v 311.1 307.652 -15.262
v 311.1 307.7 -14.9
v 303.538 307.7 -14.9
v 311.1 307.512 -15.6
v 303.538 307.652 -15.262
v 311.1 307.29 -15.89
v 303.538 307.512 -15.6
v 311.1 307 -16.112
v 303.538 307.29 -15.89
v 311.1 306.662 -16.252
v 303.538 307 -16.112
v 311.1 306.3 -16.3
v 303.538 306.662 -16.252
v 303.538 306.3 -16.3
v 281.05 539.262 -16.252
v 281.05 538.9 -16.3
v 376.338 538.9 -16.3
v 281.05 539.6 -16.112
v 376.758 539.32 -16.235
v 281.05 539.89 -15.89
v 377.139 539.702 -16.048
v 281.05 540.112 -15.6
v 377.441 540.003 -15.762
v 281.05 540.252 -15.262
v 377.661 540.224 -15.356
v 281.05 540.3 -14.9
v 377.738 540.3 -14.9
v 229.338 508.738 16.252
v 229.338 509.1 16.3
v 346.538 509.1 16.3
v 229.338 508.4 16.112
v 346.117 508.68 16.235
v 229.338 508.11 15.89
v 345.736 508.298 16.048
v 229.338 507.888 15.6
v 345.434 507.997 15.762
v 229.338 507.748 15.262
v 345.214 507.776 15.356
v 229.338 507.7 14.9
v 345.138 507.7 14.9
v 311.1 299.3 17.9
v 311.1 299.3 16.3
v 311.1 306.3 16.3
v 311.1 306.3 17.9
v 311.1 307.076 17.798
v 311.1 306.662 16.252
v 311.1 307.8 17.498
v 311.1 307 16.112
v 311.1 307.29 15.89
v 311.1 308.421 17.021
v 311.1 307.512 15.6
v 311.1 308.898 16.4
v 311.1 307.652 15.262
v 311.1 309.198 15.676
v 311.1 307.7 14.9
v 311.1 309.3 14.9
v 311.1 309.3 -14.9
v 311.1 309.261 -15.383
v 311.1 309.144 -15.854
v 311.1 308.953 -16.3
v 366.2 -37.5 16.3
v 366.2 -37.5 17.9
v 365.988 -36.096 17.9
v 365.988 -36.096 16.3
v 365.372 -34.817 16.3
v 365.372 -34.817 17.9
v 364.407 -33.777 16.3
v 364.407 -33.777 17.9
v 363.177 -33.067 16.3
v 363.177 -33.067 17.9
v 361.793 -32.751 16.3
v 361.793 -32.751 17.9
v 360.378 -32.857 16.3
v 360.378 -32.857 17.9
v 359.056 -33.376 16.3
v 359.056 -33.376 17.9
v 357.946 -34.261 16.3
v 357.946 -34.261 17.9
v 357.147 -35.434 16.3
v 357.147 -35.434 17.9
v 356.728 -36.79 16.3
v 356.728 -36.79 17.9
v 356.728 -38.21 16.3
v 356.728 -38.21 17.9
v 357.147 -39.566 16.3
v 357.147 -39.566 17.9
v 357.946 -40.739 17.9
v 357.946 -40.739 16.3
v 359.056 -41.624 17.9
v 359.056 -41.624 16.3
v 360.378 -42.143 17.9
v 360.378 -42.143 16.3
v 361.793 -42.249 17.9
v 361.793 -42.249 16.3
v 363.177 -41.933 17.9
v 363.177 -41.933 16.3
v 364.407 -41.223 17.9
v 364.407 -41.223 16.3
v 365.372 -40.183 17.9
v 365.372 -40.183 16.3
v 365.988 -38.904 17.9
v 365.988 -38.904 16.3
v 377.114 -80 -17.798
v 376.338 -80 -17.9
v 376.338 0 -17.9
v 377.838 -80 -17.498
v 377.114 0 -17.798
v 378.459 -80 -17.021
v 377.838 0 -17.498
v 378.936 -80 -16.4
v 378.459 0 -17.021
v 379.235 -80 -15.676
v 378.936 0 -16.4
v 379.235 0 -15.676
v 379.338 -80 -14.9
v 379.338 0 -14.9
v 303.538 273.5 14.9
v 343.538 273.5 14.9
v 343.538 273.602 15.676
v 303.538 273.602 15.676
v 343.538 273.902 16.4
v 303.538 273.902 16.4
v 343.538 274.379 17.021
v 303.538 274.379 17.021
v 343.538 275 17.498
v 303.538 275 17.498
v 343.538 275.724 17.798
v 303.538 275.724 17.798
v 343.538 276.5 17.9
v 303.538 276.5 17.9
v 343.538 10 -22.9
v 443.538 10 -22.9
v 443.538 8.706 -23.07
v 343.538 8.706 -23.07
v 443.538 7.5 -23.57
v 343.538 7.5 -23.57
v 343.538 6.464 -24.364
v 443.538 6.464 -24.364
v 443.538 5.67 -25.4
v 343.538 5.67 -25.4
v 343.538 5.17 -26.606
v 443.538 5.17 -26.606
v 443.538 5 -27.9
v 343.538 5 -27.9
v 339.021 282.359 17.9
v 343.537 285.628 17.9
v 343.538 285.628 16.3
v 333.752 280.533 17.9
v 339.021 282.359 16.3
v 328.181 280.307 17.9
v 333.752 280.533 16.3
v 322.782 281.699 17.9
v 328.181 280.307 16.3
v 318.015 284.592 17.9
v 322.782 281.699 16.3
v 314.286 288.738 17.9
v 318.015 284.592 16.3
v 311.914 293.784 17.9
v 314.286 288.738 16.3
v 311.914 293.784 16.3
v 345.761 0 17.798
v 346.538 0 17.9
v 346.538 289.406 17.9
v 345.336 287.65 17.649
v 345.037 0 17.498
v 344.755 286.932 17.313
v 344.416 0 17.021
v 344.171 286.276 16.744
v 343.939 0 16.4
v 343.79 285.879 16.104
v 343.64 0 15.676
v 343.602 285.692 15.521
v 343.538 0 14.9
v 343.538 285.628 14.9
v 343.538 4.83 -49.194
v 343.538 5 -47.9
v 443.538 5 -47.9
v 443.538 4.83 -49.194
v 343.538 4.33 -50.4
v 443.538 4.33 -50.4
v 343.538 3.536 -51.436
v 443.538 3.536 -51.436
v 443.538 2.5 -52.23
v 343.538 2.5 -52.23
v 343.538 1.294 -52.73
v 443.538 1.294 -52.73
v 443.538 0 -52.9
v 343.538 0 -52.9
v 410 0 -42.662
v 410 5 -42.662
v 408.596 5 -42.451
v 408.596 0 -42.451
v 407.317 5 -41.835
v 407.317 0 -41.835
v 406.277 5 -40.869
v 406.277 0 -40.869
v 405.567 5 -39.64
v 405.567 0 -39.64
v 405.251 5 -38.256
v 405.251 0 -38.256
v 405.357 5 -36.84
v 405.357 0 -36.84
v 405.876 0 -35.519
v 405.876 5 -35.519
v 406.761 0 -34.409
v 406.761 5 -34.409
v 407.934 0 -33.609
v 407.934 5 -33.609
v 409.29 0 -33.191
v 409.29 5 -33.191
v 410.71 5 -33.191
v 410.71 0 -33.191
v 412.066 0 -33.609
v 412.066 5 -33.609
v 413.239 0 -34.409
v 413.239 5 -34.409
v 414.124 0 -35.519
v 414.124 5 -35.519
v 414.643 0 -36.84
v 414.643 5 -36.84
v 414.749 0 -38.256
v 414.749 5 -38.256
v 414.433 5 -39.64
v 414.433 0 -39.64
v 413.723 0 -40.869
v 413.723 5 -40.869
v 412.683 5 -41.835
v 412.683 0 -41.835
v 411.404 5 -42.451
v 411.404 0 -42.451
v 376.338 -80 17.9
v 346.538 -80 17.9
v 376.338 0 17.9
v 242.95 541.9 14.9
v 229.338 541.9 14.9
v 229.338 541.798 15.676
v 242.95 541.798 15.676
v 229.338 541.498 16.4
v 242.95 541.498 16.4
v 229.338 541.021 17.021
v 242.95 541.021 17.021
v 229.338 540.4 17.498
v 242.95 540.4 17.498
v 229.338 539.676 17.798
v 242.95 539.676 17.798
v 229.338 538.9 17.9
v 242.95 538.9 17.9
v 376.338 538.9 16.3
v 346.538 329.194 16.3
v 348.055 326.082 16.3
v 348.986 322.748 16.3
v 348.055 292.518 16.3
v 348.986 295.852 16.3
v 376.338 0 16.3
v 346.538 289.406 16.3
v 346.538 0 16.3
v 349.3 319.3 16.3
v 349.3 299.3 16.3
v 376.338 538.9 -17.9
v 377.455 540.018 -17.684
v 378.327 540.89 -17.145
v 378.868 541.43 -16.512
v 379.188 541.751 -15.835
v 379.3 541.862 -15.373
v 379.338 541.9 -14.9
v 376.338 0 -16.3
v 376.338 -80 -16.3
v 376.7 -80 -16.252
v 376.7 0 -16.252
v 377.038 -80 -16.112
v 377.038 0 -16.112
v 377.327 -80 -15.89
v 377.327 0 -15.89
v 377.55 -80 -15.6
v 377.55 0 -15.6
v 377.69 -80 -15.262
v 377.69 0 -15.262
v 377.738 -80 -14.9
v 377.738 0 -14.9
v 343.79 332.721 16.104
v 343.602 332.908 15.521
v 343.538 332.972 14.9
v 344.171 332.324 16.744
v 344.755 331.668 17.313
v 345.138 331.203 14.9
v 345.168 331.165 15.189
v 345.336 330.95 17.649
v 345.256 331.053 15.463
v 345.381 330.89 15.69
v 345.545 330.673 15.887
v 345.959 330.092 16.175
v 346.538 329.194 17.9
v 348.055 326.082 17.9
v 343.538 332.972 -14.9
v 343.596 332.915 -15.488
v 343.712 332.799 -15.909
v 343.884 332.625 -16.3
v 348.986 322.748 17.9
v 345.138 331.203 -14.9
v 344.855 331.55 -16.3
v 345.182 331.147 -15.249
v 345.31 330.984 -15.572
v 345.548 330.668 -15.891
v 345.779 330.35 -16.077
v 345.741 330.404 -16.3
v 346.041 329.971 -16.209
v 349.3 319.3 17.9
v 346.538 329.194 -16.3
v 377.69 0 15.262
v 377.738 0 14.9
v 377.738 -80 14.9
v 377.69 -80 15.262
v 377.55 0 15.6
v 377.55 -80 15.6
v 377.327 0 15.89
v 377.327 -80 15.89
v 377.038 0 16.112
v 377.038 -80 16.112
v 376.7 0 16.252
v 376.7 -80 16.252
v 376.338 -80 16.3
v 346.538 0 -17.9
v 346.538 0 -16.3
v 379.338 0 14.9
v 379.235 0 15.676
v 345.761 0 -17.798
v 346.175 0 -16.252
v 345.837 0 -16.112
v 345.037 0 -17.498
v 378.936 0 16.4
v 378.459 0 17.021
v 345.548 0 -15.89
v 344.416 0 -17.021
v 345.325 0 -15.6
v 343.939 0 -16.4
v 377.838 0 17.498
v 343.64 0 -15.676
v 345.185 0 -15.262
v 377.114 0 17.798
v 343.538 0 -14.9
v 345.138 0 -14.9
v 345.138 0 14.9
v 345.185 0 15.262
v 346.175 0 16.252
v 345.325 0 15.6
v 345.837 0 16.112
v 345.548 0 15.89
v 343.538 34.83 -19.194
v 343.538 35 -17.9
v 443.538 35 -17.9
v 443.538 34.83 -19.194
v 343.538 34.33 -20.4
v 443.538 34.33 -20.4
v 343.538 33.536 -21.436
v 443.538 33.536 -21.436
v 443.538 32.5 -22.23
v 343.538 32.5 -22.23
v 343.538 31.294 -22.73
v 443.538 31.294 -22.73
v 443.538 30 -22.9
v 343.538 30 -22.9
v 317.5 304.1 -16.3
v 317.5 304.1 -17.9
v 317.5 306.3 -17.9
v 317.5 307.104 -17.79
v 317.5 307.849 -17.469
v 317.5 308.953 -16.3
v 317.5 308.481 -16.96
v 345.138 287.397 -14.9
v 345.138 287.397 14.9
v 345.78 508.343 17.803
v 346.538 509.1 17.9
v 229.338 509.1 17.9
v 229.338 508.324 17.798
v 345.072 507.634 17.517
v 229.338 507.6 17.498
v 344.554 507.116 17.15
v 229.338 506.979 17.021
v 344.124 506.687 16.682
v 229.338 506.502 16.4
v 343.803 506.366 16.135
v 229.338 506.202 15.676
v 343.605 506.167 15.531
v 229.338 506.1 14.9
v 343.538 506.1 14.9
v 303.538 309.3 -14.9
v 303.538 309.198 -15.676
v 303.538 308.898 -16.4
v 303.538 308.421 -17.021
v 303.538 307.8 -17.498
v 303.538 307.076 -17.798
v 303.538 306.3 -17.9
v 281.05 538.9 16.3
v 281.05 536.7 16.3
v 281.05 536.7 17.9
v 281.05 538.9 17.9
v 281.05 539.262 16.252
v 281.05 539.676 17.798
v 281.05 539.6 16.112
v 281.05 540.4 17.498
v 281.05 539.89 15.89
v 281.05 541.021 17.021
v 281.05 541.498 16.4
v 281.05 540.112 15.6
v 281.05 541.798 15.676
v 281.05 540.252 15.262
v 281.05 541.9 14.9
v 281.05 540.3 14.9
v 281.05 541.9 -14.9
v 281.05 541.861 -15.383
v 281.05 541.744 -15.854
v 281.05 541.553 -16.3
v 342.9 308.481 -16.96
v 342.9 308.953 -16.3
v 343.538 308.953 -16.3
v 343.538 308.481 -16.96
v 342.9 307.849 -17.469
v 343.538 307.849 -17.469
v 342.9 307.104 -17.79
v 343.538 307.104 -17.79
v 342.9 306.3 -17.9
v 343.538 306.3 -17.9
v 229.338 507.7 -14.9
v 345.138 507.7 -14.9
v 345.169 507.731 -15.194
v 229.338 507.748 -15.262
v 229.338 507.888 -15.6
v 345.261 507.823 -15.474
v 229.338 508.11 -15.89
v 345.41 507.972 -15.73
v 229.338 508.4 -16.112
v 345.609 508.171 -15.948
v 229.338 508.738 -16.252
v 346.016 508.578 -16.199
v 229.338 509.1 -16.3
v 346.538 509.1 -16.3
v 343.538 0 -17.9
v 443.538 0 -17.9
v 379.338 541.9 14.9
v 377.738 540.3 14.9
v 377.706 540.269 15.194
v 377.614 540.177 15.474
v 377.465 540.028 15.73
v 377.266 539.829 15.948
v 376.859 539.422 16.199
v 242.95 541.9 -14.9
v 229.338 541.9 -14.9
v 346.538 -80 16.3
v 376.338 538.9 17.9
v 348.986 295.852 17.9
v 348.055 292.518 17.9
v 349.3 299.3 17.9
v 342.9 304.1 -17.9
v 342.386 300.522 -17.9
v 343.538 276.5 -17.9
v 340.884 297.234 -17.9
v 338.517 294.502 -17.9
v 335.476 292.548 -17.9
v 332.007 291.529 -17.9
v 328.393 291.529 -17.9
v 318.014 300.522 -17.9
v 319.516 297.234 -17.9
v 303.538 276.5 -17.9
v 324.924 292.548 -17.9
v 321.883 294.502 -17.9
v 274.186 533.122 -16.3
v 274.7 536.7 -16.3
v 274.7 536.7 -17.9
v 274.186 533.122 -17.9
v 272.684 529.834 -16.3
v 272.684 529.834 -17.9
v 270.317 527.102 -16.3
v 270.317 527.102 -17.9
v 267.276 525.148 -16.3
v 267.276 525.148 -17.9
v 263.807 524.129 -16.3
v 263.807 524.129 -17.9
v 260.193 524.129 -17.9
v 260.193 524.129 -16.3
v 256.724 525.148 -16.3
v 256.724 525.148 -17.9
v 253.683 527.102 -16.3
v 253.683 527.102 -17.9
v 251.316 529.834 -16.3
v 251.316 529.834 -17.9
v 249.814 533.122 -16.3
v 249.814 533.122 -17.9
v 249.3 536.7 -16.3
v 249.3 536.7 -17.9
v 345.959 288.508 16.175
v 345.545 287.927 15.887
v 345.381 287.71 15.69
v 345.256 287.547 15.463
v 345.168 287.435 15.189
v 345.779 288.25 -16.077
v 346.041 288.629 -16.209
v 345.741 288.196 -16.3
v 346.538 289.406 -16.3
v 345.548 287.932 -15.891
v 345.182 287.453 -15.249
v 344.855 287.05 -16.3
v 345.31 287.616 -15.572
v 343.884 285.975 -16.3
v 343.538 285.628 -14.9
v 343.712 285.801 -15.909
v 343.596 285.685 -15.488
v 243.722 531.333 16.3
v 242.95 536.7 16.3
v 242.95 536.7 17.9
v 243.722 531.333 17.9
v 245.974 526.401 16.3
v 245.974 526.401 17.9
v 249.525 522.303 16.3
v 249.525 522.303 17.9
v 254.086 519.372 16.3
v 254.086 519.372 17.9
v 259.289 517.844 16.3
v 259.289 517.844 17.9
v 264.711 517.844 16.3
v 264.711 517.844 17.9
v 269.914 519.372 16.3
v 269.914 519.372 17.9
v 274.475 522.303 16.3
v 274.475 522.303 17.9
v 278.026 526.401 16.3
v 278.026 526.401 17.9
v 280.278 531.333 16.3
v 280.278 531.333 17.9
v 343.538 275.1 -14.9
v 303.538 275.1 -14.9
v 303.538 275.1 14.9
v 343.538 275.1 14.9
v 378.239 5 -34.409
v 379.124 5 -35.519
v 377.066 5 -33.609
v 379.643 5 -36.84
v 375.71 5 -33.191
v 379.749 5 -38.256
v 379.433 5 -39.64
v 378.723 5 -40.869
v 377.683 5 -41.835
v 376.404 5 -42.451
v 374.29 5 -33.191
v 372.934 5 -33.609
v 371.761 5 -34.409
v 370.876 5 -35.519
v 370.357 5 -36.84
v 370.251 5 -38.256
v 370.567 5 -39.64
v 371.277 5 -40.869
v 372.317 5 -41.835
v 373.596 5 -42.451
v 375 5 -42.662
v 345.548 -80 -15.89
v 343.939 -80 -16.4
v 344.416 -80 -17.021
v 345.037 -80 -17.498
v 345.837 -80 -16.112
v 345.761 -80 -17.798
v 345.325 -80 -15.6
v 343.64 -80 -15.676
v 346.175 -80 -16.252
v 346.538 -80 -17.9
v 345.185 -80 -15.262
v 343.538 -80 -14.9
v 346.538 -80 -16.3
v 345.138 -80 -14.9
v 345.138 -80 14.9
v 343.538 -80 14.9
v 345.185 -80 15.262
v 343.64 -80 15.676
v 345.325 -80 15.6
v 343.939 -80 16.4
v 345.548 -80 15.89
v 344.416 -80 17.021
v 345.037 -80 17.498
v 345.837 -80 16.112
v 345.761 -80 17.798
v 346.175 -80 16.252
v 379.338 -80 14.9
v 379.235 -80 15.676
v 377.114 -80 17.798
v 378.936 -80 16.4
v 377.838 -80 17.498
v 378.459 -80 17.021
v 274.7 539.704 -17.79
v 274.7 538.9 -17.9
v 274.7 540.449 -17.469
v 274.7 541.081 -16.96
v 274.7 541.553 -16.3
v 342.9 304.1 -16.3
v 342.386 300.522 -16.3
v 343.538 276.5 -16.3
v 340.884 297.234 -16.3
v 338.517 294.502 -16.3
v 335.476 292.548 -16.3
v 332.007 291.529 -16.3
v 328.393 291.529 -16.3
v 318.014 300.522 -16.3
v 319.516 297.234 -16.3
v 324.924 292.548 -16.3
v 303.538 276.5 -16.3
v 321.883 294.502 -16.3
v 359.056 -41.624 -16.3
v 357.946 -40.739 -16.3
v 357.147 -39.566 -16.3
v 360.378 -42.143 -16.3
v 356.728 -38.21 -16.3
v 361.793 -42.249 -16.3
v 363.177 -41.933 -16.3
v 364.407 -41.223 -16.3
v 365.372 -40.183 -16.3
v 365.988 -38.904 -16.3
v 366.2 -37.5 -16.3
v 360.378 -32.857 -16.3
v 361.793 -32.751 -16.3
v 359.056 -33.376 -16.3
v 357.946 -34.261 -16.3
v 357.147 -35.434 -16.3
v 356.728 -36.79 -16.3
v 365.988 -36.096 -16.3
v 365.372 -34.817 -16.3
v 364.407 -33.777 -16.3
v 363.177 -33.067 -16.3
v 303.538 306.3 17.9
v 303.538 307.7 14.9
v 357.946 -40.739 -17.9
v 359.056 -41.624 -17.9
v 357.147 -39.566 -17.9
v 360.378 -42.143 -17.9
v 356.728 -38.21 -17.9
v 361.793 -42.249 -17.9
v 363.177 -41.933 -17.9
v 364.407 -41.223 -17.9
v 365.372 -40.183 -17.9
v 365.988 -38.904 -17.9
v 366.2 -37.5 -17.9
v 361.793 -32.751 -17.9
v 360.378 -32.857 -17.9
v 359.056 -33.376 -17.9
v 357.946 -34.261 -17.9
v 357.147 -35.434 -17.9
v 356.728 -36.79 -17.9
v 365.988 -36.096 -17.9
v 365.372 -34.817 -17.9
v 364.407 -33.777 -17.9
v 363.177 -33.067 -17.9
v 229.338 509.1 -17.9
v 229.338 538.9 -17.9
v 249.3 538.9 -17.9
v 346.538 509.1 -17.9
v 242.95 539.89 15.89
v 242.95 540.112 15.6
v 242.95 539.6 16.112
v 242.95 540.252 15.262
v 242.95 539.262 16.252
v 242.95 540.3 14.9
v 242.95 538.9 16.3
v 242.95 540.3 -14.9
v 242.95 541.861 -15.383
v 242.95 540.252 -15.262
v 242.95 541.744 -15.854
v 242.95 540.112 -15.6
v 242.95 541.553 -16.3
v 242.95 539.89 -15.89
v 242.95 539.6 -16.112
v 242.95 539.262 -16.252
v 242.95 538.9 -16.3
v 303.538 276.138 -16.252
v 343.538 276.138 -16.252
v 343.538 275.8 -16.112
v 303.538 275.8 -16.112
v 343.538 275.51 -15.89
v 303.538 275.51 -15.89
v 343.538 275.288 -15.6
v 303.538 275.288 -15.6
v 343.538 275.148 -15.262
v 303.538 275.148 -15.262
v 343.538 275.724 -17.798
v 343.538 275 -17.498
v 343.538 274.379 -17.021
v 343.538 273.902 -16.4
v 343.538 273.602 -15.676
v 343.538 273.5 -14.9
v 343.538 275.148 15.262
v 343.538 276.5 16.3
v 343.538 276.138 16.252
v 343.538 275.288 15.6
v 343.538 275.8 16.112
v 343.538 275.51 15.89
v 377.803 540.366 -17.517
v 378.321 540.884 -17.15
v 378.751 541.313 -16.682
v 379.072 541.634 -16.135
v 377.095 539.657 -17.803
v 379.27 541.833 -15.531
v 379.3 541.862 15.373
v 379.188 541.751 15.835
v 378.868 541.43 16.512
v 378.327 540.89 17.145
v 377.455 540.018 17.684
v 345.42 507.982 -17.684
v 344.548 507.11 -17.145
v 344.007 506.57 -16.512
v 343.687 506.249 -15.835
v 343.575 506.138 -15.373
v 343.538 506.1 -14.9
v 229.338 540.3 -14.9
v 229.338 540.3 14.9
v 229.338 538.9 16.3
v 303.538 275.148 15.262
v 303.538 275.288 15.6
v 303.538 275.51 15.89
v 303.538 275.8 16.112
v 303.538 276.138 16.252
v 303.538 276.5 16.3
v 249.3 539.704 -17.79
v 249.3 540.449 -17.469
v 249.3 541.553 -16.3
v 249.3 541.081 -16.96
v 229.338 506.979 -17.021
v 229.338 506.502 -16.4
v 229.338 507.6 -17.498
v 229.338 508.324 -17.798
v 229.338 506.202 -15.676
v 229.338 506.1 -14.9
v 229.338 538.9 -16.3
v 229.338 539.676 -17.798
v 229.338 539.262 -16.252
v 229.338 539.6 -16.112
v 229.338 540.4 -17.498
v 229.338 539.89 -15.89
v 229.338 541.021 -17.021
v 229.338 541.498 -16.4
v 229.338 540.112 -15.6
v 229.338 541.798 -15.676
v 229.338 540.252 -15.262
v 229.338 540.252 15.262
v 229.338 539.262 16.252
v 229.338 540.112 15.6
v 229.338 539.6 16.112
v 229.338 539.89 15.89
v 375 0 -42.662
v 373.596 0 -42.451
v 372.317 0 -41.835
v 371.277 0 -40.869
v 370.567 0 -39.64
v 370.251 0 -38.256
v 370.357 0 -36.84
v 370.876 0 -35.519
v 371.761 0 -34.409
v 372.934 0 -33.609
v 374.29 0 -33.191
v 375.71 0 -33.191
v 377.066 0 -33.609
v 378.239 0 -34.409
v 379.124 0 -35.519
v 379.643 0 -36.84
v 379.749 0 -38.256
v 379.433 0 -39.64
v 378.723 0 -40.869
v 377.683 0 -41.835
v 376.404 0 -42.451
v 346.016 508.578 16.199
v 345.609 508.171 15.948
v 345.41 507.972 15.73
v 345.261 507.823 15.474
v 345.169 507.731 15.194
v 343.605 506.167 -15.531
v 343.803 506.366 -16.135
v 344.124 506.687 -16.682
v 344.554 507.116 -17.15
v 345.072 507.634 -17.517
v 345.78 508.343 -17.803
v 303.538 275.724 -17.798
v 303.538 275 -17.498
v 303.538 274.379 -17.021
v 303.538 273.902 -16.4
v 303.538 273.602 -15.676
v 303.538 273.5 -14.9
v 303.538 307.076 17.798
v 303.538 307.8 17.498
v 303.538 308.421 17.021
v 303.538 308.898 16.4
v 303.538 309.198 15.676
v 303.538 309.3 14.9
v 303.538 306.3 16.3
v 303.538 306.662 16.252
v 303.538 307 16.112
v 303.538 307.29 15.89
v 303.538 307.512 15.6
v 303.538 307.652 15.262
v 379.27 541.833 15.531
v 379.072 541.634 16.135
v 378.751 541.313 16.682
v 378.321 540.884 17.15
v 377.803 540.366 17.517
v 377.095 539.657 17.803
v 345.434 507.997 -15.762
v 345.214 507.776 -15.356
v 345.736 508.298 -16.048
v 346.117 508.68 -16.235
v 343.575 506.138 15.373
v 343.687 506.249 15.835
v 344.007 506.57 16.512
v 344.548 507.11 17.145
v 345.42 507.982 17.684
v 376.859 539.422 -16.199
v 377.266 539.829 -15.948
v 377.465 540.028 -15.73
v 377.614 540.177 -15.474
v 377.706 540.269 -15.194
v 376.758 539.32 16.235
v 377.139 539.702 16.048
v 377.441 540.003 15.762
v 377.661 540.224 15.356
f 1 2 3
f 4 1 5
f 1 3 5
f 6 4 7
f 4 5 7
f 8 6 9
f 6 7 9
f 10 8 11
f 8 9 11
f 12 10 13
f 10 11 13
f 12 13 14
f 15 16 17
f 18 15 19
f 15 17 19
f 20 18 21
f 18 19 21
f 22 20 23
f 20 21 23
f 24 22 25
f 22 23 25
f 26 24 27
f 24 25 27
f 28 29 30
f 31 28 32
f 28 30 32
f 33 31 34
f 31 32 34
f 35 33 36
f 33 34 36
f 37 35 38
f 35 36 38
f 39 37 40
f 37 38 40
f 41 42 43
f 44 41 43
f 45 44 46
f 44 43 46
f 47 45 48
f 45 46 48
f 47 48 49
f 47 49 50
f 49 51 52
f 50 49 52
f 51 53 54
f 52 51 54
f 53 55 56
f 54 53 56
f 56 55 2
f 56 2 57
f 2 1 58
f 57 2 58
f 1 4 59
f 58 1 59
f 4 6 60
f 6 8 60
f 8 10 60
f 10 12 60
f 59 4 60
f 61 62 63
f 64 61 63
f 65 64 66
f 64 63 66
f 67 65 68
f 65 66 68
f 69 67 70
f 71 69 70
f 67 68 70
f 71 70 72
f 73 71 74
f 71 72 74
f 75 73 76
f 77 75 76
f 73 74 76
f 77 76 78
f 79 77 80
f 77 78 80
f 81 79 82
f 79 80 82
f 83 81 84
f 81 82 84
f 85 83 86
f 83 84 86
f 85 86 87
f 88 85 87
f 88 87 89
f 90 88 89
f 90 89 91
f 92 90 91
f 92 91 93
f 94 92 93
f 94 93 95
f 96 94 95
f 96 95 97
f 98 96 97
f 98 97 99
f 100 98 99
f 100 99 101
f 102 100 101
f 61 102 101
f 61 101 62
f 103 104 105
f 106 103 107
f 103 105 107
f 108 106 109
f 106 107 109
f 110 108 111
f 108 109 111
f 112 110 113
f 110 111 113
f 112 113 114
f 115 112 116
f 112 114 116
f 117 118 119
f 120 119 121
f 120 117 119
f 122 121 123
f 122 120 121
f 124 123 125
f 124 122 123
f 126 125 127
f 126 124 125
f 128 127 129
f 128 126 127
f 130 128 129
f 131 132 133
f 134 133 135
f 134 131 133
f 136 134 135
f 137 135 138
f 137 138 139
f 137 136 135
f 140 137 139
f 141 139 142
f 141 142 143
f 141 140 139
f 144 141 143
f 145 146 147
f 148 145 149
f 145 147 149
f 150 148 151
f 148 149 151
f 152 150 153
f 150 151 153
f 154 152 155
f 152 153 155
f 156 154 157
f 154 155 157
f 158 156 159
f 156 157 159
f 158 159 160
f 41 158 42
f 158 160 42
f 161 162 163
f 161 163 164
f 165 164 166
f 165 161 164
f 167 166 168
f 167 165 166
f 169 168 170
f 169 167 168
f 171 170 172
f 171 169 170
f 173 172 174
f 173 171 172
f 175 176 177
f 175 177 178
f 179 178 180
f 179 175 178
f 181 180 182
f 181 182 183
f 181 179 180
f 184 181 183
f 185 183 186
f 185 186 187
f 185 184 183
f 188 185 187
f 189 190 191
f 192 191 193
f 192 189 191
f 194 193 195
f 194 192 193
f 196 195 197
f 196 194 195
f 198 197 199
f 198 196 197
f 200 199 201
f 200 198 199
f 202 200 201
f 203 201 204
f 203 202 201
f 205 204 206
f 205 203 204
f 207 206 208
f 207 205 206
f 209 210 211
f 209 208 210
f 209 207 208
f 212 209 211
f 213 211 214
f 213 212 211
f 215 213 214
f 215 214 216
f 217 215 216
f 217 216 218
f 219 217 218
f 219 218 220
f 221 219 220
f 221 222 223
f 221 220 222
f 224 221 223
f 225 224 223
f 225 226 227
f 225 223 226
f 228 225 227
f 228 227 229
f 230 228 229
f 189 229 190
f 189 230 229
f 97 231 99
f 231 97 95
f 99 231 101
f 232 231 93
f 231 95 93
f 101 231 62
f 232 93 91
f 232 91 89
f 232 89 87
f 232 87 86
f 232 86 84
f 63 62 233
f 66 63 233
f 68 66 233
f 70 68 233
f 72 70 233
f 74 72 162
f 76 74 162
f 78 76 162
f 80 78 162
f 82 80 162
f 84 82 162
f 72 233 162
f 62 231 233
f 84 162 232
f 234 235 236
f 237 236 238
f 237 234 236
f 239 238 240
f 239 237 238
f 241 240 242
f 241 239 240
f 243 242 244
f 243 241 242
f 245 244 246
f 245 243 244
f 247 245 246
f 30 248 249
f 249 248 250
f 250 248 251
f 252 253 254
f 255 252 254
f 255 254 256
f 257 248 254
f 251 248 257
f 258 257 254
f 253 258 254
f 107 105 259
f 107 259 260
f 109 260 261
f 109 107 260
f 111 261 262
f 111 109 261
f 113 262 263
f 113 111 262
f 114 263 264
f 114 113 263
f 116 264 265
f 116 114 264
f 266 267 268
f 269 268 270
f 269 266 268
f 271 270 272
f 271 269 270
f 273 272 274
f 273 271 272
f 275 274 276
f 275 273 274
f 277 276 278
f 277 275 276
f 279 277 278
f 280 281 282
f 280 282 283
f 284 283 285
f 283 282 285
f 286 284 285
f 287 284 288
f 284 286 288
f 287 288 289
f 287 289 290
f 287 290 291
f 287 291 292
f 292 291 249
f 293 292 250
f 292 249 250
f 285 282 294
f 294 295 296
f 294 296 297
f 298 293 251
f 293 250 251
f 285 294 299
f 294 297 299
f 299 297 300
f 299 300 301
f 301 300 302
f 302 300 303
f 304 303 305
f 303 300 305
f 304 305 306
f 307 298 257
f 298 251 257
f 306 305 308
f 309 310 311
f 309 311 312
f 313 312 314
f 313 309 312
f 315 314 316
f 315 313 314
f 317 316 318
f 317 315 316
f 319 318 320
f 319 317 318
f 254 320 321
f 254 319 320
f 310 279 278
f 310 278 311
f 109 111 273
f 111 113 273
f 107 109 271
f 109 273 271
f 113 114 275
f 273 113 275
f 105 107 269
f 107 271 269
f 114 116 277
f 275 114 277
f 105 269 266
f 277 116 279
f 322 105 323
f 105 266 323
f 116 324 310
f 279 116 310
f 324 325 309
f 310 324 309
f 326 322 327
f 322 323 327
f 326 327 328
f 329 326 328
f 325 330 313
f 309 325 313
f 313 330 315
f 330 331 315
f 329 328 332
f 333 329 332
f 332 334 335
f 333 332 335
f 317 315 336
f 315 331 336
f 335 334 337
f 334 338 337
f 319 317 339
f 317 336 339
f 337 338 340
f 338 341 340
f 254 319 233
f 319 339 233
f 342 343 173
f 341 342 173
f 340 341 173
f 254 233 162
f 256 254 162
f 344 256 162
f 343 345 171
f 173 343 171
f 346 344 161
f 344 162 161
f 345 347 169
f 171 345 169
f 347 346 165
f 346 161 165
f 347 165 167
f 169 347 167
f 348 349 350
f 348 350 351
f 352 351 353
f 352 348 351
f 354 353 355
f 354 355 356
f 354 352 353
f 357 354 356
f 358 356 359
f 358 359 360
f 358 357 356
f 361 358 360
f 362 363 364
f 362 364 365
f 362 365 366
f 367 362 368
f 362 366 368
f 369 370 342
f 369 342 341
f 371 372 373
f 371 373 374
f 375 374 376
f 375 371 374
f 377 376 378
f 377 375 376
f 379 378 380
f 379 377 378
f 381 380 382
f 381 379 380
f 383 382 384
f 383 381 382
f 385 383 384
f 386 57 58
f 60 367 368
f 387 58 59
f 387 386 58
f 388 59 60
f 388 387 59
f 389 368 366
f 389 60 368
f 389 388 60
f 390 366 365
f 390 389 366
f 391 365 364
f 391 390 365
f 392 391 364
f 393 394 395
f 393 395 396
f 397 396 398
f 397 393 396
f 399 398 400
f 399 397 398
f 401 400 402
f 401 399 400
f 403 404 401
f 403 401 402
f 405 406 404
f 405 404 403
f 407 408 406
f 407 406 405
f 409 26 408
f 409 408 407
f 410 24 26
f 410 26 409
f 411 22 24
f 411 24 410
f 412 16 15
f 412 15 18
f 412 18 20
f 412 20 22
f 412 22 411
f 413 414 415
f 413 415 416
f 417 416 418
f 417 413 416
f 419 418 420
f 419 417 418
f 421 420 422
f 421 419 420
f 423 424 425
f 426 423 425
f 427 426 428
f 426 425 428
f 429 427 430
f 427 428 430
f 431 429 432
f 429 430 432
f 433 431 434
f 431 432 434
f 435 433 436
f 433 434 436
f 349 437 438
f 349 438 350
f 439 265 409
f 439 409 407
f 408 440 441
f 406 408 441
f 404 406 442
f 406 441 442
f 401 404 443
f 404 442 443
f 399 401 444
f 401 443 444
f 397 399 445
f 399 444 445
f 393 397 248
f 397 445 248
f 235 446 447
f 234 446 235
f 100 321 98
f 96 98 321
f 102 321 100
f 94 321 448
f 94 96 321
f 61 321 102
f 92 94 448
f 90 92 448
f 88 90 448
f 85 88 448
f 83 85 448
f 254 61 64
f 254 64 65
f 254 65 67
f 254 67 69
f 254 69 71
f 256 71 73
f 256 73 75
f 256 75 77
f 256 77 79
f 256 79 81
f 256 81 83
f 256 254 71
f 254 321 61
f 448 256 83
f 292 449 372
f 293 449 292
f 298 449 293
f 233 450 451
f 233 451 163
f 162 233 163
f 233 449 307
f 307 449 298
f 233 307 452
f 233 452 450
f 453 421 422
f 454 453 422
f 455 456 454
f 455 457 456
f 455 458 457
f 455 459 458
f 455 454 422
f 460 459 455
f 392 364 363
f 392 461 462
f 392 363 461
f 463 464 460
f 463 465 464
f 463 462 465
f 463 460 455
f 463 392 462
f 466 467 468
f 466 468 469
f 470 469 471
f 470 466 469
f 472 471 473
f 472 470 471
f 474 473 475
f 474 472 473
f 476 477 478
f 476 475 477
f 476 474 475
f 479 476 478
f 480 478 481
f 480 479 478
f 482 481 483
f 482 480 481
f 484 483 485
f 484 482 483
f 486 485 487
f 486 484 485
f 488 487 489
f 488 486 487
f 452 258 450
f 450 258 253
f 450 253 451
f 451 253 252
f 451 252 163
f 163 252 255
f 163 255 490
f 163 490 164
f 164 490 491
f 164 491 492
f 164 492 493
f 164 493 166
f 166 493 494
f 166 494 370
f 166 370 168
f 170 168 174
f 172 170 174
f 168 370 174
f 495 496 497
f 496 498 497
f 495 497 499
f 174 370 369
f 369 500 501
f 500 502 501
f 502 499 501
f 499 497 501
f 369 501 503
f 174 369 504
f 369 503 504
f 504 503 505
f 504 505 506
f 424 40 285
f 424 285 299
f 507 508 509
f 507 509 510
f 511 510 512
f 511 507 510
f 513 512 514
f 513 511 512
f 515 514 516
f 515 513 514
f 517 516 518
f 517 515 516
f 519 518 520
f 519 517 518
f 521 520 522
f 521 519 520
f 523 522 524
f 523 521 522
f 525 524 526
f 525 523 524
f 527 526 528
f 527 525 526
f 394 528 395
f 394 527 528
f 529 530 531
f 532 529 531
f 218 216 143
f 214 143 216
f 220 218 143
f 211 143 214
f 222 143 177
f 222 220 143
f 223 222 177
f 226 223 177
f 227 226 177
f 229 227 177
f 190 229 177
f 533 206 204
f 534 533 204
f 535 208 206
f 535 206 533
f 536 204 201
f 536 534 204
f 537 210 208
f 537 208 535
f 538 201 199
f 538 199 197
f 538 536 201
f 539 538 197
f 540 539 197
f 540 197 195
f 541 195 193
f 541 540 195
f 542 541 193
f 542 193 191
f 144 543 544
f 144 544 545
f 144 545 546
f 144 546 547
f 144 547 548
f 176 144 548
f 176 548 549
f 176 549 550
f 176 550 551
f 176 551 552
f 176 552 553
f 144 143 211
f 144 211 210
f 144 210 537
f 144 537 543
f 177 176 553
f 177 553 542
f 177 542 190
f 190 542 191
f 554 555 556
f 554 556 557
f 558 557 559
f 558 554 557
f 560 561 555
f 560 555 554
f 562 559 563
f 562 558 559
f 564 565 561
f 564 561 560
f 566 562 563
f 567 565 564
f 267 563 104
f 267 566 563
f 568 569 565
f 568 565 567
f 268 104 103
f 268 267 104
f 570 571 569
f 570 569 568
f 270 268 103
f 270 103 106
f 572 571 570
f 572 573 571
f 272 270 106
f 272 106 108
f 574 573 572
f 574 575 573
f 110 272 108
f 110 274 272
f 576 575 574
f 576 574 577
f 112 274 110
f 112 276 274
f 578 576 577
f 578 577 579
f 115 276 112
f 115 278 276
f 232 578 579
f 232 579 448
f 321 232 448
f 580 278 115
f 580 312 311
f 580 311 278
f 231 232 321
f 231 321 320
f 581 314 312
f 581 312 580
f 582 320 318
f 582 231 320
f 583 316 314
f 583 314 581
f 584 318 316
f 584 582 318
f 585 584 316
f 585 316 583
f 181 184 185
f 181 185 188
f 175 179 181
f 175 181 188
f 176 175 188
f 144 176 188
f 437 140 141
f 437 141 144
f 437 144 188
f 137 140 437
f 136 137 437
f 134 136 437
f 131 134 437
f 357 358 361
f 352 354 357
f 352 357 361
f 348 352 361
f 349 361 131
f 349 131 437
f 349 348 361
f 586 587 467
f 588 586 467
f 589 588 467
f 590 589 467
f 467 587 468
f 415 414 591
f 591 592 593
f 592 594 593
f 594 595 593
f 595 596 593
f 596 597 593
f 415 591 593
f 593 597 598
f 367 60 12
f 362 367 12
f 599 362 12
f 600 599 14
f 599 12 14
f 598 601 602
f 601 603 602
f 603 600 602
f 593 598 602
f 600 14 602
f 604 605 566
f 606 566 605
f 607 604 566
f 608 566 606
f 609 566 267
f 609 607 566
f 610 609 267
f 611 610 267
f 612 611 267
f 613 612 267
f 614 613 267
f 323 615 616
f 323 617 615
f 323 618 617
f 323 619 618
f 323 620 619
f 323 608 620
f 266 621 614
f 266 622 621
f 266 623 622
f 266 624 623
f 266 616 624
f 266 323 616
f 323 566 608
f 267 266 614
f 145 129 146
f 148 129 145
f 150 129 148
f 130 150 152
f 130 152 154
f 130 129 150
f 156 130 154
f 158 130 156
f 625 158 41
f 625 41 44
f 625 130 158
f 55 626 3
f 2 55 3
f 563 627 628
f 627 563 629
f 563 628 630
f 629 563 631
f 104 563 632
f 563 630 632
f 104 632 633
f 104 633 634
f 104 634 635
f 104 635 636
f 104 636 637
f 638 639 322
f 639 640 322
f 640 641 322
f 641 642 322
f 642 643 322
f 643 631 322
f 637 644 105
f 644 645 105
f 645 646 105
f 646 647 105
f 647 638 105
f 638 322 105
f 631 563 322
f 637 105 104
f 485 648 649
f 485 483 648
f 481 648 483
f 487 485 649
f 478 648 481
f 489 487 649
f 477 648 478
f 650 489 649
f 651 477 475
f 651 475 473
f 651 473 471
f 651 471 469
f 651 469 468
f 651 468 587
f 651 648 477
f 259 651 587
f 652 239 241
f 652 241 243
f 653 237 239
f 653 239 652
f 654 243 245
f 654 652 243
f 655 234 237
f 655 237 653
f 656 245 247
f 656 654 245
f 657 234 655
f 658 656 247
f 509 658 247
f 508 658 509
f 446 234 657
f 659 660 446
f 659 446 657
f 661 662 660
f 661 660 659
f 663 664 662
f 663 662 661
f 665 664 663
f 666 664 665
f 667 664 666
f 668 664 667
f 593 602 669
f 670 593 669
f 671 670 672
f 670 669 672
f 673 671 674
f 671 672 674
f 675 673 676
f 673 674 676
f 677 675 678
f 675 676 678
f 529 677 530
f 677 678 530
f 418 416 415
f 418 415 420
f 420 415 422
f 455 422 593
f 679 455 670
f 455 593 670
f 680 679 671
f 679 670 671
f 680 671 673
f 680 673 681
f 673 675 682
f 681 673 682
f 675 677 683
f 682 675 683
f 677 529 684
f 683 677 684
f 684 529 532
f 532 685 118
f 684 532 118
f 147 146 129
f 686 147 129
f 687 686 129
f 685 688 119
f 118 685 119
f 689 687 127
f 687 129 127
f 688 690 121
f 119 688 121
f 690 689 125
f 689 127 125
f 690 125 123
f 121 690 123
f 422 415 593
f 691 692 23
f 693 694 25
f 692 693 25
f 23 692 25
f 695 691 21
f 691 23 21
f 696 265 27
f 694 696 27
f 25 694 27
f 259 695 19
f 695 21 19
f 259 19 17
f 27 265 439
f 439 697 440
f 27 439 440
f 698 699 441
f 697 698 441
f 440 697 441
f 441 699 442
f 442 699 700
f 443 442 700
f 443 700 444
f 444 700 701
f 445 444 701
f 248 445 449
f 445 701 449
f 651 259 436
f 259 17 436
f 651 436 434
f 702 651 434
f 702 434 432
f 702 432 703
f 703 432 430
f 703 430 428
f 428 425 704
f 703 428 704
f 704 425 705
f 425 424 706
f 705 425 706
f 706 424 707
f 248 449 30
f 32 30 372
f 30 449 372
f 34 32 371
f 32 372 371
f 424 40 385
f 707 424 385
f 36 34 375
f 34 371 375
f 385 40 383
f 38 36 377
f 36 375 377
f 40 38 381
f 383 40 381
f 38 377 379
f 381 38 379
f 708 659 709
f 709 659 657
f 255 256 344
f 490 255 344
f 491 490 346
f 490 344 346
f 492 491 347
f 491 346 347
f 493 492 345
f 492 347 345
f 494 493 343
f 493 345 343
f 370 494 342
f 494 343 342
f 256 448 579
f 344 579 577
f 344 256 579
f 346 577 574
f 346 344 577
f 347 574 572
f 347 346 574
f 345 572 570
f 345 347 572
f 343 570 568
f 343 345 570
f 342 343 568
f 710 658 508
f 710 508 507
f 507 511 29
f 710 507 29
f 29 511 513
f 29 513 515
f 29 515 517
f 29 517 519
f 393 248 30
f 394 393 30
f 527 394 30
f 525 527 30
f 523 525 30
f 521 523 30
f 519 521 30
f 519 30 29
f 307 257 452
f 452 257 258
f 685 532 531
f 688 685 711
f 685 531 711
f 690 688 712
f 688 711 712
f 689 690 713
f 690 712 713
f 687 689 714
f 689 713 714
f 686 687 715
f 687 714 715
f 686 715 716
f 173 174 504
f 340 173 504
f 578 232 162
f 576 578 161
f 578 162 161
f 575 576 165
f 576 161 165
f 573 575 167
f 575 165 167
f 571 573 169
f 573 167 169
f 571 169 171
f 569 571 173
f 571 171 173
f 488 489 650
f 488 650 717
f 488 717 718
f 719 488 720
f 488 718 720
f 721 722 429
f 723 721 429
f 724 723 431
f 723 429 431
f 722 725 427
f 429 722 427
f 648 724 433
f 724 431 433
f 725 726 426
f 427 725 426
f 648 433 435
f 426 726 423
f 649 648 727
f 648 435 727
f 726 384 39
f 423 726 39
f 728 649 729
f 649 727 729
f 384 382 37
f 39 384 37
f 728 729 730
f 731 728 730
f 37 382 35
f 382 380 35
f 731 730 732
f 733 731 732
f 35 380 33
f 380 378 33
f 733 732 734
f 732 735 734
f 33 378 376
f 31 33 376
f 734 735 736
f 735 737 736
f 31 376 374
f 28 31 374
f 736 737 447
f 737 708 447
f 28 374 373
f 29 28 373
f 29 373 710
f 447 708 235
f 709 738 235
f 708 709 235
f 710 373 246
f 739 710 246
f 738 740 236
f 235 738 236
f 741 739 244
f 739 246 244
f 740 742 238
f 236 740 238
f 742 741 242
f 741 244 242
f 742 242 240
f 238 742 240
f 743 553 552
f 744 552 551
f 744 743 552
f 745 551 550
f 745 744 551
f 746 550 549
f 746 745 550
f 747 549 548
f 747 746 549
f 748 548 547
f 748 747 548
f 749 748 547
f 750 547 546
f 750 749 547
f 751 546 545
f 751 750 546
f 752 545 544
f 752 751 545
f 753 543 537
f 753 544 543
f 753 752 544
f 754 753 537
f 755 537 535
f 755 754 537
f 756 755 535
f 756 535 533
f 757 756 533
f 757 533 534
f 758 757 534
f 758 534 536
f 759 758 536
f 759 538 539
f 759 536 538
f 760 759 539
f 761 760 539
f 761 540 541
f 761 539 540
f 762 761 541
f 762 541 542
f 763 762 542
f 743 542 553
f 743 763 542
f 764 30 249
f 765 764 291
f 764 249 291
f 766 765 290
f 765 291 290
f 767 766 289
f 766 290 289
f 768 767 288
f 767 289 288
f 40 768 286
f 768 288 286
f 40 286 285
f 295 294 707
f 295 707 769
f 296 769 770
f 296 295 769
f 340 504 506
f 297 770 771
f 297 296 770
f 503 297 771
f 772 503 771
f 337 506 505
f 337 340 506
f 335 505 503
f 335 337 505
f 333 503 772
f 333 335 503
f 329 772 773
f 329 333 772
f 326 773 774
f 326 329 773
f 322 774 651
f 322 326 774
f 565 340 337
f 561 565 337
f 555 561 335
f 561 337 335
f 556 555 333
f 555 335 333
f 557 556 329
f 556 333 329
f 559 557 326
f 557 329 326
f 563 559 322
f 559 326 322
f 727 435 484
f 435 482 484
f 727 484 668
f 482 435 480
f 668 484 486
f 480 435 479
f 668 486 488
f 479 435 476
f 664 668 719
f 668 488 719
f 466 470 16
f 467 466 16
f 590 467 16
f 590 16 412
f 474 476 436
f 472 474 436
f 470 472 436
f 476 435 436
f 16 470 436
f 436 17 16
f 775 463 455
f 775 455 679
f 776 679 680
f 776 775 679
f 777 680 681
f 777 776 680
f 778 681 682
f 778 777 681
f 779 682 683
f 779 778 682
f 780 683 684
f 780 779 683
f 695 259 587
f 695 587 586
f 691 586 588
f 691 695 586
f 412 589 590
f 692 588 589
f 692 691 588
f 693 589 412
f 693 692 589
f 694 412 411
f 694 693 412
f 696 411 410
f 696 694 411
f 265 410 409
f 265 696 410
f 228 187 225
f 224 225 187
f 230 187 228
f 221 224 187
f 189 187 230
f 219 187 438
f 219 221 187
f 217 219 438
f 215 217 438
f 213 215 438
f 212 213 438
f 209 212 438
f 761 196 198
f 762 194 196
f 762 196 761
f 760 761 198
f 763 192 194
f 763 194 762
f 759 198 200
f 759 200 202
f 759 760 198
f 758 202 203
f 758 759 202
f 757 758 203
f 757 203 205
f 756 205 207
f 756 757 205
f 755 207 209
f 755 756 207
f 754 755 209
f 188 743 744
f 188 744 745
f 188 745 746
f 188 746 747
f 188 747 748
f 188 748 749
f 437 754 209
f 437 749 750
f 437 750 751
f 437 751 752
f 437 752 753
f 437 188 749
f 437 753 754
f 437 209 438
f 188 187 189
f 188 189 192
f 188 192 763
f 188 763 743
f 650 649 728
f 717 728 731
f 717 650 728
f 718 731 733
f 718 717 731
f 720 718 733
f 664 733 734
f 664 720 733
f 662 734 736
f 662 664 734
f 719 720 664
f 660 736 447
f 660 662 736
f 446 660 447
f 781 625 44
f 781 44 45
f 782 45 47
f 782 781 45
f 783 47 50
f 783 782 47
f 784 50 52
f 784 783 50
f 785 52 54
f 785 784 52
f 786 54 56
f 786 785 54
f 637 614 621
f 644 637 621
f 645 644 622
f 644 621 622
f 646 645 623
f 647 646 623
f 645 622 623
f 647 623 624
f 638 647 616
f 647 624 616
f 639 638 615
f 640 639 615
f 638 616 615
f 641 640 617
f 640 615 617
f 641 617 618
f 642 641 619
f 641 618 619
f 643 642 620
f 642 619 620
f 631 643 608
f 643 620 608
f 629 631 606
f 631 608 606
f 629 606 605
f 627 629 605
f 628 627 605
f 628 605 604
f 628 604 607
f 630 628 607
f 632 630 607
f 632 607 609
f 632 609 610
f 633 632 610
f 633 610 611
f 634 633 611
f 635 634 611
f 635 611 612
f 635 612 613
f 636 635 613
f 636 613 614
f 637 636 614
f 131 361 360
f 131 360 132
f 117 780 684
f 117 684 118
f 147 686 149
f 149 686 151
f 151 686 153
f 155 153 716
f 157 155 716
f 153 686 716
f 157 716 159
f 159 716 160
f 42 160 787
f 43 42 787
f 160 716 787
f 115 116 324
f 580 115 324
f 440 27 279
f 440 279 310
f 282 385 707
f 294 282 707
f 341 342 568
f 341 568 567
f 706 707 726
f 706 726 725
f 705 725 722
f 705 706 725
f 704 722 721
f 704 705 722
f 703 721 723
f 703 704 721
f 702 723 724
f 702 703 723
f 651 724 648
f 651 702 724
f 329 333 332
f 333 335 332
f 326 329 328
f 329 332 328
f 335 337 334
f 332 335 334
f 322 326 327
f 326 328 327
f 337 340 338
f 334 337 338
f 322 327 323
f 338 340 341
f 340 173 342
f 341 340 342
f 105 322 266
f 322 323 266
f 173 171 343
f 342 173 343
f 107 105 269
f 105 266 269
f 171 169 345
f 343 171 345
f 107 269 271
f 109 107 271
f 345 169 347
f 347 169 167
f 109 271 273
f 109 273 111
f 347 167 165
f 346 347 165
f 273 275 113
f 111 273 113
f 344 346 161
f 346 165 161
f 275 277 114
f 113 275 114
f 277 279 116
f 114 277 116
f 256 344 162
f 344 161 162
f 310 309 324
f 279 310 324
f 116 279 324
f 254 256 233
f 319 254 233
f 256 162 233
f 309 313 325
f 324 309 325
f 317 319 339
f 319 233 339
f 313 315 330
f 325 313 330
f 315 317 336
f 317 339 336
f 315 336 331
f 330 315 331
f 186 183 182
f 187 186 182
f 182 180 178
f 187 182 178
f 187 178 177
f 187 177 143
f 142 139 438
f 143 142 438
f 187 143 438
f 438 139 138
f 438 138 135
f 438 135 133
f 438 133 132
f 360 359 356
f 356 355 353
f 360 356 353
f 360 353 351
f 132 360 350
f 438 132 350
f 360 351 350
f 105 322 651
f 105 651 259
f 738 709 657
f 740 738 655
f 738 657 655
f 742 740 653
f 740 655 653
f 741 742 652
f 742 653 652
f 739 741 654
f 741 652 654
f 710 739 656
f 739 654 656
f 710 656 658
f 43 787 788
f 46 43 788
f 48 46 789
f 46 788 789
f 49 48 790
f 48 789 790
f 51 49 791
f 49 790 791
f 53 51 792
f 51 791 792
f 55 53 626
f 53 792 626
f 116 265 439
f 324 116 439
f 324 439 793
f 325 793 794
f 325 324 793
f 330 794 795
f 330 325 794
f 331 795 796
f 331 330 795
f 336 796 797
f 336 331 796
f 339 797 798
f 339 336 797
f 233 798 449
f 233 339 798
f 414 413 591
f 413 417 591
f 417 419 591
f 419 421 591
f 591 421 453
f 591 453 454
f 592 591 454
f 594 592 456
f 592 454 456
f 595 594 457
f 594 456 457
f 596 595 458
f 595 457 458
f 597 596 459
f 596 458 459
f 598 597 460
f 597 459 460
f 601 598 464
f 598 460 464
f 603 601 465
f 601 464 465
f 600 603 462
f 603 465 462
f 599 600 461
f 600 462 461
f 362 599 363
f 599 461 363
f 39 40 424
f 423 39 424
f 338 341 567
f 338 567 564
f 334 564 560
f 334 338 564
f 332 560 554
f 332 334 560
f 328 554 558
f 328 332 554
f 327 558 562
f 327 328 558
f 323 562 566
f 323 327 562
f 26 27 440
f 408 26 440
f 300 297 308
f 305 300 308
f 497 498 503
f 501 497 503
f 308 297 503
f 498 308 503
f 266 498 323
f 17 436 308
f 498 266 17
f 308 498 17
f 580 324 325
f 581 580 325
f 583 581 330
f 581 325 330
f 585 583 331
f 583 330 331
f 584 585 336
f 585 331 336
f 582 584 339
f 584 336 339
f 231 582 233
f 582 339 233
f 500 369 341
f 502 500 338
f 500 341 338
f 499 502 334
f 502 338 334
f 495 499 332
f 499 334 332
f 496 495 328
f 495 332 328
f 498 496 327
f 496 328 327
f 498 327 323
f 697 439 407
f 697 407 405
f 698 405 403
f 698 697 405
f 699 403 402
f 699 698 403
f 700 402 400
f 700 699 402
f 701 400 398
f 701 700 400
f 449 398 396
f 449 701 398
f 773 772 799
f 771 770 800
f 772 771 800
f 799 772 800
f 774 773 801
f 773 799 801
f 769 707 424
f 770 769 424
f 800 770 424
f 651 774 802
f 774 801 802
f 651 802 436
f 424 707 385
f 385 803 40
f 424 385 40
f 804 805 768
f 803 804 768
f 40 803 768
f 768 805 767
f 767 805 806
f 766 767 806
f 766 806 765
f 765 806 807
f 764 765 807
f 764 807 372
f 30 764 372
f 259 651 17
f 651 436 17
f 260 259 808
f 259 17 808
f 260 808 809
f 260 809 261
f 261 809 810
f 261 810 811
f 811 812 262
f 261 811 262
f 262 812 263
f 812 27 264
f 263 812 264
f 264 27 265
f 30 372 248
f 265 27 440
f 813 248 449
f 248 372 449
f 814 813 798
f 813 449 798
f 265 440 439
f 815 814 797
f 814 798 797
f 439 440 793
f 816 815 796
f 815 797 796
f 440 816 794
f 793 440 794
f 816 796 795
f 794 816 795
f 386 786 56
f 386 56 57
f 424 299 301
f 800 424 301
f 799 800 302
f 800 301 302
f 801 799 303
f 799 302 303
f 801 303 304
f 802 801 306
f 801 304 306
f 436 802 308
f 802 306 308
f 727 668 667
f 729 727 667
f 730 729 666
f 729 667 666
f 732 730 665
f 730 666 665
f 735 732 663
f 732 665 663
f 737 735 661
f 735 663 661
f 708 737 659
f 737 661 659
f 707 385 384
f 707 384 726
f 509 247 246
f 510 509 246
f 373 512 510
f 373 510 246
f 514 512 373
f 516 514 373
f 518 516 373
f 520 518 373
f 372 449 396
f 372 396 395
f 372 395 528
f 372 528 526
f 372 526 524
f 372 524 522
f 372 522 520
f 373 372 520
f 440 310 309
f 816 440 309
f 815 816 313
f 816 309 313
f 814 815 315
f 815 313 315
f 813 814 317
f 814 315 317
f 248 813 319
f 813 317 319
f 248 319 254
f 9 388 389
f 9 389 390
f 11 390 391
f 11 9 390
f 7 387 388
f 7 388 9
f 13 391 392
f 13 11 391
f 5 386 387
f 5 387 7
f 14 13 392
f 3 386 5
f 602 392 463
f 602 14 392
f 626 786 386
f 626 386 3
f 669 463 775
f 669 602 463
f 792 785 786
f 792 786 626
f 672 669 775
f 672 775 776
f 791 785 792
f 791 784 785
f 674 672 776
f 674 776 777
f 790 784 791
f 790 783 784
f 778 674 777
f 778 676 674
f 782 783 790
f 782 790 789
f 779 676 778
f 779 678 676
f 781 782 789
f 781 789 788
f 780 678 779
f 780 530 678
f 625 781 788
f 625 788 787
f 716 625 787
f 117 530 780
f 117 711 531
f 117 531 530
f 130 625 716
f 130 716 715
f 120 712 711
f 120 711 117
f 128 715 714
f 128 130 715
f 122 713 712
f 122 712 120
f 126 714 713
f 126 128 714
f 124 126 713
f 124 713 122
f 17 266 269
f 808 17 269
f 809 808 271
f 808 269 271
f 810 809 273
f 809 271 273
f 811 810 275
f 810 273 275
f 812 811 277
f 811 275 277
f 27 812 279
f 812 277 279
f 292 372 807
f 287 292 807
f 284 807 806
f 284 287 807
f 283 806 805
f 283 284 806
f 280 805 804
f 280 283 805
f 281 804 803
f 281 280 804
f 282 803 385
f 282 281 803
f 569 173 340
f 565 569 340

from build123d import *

# Parameters (mm, degrees)
STRUCTURAL_MEMBERMAIN_DEPTH                   = 1
STRUCTURAL_MEMBERMAIN_DEPTH_BACK              = 80
STRUCTURAL_MEMBERMAIN_2_DEPTH                 = 551.314422766
STRUCTURAL_MEMBERMAIN_3_DEPTH                 = 158.414422766
STRUCTURAL_MEMBERMAIN_4_DEPTH                 = 58.9
CUT_EXTRUDETOPRAILGUIDE_DEPTH                 = 662.71969814
CUT_EXTRUDETOPRAILGUIDE_DEPTH_BACK            = 662.71969814
STRUCTURAL_MEMBERANGLE_DEPTH                  = 100
SKETCH15_R                                    = 4.7625
CUT_EXTRUDEMOUNTINGHOLES_DEPTH                = 703.267423355
CUT_EXTRUDEENLARGERAILGUIDE_REACH             = 704.267
CUT_EXTRUDEENLARGERAILGUIDE_DIRECTION_2_DEPTH = 703.267423355
CUT_EXTRUDE1_DEPTH                            = 702.186682636
CUT_EXTRUDE2_START                            = -34.2
CUT_EXTRUDE2_DEPTH                            = 34.2
SKETCH19_R                                    = 4.7625
CUT_EXTRUDE3_DEPTH                            = 704.842144167


with BuildPart() as part:
    # Sketch11 → Structural MemberMain (new, two sides)
    with BuildSketch(Plane(origin=(361.4375, 0, 0), x_dir=(-1, 0, 0), z_dir=(0, 1, 0))) as structural_membermain_sk:
        with BuildLine():
            Line((-14.9, 17.9), (14.9, 17.9))
            ThreePointArc((14.9, 17.9), (17.021320344, 17.021320344), (17.9, 14.9))
            Line((17.9, 14.9), (17.9, -14.9))
            ThreePointArc((17.9, -14.9), (17.021320344, -17.021320344), (14.9, -17.9))
            Line((14.9, -17.9), (-14.9, -17.9))
            ThreePointArc((-14.9, -17.9), (-17.021320344, -17.021320344), (-17.9, -14.9))
            Line((-17.9, -14.9), (-17.9, 14.9))
            ThreePointArc((-17.9, 14.9), (-17.021320344, 17.021320344), (-14.9, 17.9))
        make_face()
        with BuildLine():
            Line((-14.9, 16.3), (14.9, 16.3))
            ThreePointArc((14.9, 16.3), (15.889949494, 15.889949494), (16.3, 14.9))
            Line((16.3, 14.9), (16.3, -14.9))
            ThreePointArc((16.3, -14.9), (15.889949494, -15.889949494), (14.9, -16.3))
            Line((14.9, -16.3), (-14.9, -16.3))
            ThreePointArc((-14.9, -16.3), (-15.889949494, -15.889949494), (-16.3, -14.9))
            Line((-16.3, -14.9), (-16.3, 14.9))
            ThreePointArc((-16.3, 14.9), (-15.889949494, 15.889949494), (-14.9, 16.3))
        make_face(mode=Mode.SUBTRACT)
    extrude(amount=STRUCTURAL_MEMBERMAIN_DEPTH)
    extrude(structural_membermain_sk.sketch, amount=-STRUCTURAL_MEMBERMAIN_DEPTH_BACK)

    # Structural MemberMain mitre 1
    split(bisect_by=Plane(origin=(361.4375, 0, 0), x_dir=(1, 0, 0), z_dir=(0, -1, 0)), keep=Keep.TOP)

    # Sketch19 → Cut-Extrude3 (cut, through all)
    with BuildSketch(Plane.XY.offset(17.9)):
        with Locations((361.4375, -37.5)):
            Circle(SKETCH19_R)
    extrude(amount=-CUT_EXTRUDE3_DEPTH, mode=Mode.SUBTRACT)


with BuildPart() as body_2:
    # Sketch11 on segment 2 (carried to segment 2) → Structural MemberMain 2 (new body)
    with BuildSketch(Plane(origin=(361.4375, -1, 0), x_dir=(-1, 0, 0), z_dir=(0, 1, 0))):
        with BuildLine():
            Line((-14.9, 17.9), (14.9, 17.9))
            ThreePointArc((14.9, 17.9), (17.021320344, 17.021320344), (17.9, 14.9))
            Line((17.9, 14.9), (17.9, -14.9))
            ThreePointArc((17.9, -14.9), (17.021320344, -17.021320344), (14.9, -17.9))
            Line((14.9, -17.9), (-14.9, -17.9))
            ThreePointArc((-14.9, -17.9), (-17.021320344, -17.021320344), (-17.9, -14.9))
            Line((-17.9, -14.9), (-17.9, 14.9))
            ThreePointArc((-17.9, 14.9), (-17.021320344, 17.021320344), (-14.9, 17.9))
        make_face()
        with BuildLine():
            Line((-14.9, 16.3), (14.9, 16.3))
            ThreePointArc((14.9, 16.3), (15.889949494, 15.889949494), (16.3, 14.9))
            Line((16.3, 14.9), (16.3, -14.9))
            ThreePointArc((16.3, -14.9), (15.889949494, -15.889949494), (14.9, -16.3))
            Line((14.9, -16.3), (-14.9, -16.3))
            ThreePointArc((-14.9, -16.3), (-15.889949494, -15.889949494), (-16.3, -14.9))
            Line((-16.3, -14.9), (-16.3, 14.9))
            ThreePointArc((-16.3, 14.9), (-15.889949494, 15.889949494), (-14.9, 16.3))
        make_face(mode=Mode.SUBTRACT)
    extrude(amount=STRUCTURAL_MEMBERMAIN_2_DEPTH)

    # Structural MemberMain 2 mitre 1
    split(bisect_by=Plane(origin=(361.4375, 0, 0), x_dir=(-1, 0, 0), z_dir=(0, 1, 0)), keep=Keep.TOP)

    # Structural MemberMain 2 mitre 2
    split(bisect_by=Plane(origin=(361.4375, 524, 0), x_dir=(0.707106781, 0.707106781, 0), z_dir=(0.707106781, -0.707106781, 0)), keep=Keep.TOP)


with BuildPart() as body_3:
    # Sketch11 on segment 3 (carried to segment 3) → Structural MemberMain 3 (new body)
    with BuildSketch(Plane(origin=(387.751922766, 524, 0), x_dir=(0, -1, 0), z_dir=(-1, 0, 0))):
        with BuildLine():
            Line((-14.9, 17.9), (14.9, 17.9))
            ThreePointArc((14.9, 17.9), (17.021320344, 17.021320344), (17.9, 14.9))
            Line((17.9, 14.9), (17.9, -14.9))
            ThreePointArc((17.9, -14.9), (17.021320344, -17.021320344), (14.9, -17.9))
            Line((14.9, -17.9), (-14.9, -17.9))
            ThreePointArc((-14.9, -17.9), (-17.021320344, -17.021320344), (-17.9, -14.9))
            Line((-17.9, -14.9), (-17.9, 14.9))
            ThreePointArc((-17.9, 14.9), (-17.021320344, 17.021320344), (-14.9, 17.9))
        make_face()
        with BuildLine():
            Line((-14.9, 16.3), (14.9, 16.3))
            ThreePointArc((14.9, 16.3), (15.889949494, 15.889949494), (16.3, 14.9))
            Line((16.3, 14.9), (16.3, -14.9))
            ThreePointArc((16.3, -14.9), (15.889949494, -15.889949494), (14.9, -16.3))
            Line((14.9, -16.3), (-14.9, -16.3))
            ThreePointArc((-14.9, -16.3), (-15.889949494, -15.889949494), (-16.3, -14.9))
            Line((-16.3, -14.9), (-16.3, 14.9))
            ThreePointArc((-16.3, 14.9), (-15.889949494, 15.889949494), (-14.9, 16.3))
        make_face(mode=Mode.SUBTRACT)
    extrude(amount=STRUCTURAL_MEMBERMAIN_3_DEPTH)

    # Structural MemberMain 3 mitre 1
    split(bisect_by=Plane(origin=(361.4375, 524, 0), x_dir=(-0.707106781, -0.707106781, 0), z_dir=(-0.707106781, 0.707106781, 0)), keep=Keep.TOP)

    # Sketch12 → Cut-ExtrudeTopRailGuide (cut, two sides)
    with BuildSketch(Plane.XY) as cut_extrudetoprailguide_sk:
        with BuildLine():
            Line((249.3, 536.7), (249.3, 547.1))
            ThreePointArc((249.3, 547.1), (262, 559.8), (274.7, 547.1))
            Line((274.7, 547.1), (274.7, 536.7))
            ThreePointArc((274.7, 536.7), (262, 524), (249.3, 536.7))
        make_face()
    extrude(amount=CUT_EXTRUDETOPRAILGUIDE_DEPTH, mode=Mode.SUBTRACT)
    extrude(cut_extrudetoprailguide_sk.sketch, amount=-CUT_EXTRUDETOPRAILGUIDE_DEPTH_BACK, mode=Mode.SUBTRACT)

    # Cut-ExtrudeEnlargeRailGuide: up to this face of the body (flat: up to its plane)
    cut_extrudeenlargerailguide_end = Plane(body_3.part.faces().sort_by_distance((298.537789585, 523.884806009, -16.3))[0])
    # Sketch16 → Cut-ExtrudeEnlargeRailGuide (cut, up to the picked face)
    with BuildSketch(Plane.XY, mode=Mode.PRIVATE) as cut_extrudeenlargerailguide_sk1:
        with BuildLine():
            Line((281.05, 536.7), (281.05, 547.1))
            ThreePointArc((281.05, 547.1), (262, 566.15), (242.95, 547.1))
            Line((242.95, 547.1), (242.95, 536.7))
            ThreePointArc((242.95, 536.7), (262, 517.65), (281.05, 536.7))
        make_face()
    cut_extrudeenlargerailguide_tool1 = split(extrude(cut_extrudeenlargerailguide_sk1.sketch, amount=-CUT_EXTRUDEENLARGERAILGUIDE_REACH, mode=Mode.PRIVATE), bisect_by=cut_extrudeenlargerailguide_end, keep=Keep.BOTH, mode=Mode.PRIVATE)
    add(cut_extrudeenlargerailguide_tool1.solids().sort_by(Axis((262, 541.9, 0), (0, 0, -1)))[0], mode=Mode.SUBTRACT)

    # Sketch16 → Cut-ExtrudeEnlargeRailGuide direction 2 (cut)
    with BuildSketch(Plane.XY):
        with BuildLine():
            Line((281.05, 536.7), (281.05, 547.1))
            ThreePointArc((281.05, 547.1), (262, 566.15), (242.95, 547.1))
            Line((242.95, 547.1), (242.95, 536.7))
            ThreePointArc((242.95, 536.7), (262, 517.65), (281.05, 536.7))
        make_face()
    extrude(amount=CUT_EXTRUDEENLARGERAILGUIDE_DIRECTION_2_DEPTH, mode=Mode.SUBTRACT)


with BuildPart() as body_4:
    # Sketch11 on segment 4 (carried to segment 4) → Structural MemberMain 4 (new body)
    with BuildSketch(Plane(origin=(303.5375, 291.4, 0), x_dir=(0, 1, 0), z_dir=(1, 0, 0))):
        with BuildLine():
            Line((-14.9, 17.9), (14.9, 17.9))
            ThreePointArc((14.9, 17.9), (17.021320344, 17.021320344), (17.9, 14.9))
            Line((17.9, 14.9), (17.9, -14.9))
            ThreePointArc((17.9, -14.9), (17.021320344, -17.021320344), (14.9, -17.9))
            Line((14.9, -17.9), (-14.9, -17.9))
            ThreePointArc((-14.9, -17.9), (-17.021320344, -17.021320344), (-17.9, -14.9))
            Line((-17.9, -14.9), (-17.9, 14.9))
            ThreePointArc((-17.9, 14.9), (-17.021320344, 17.021320344), (-14.9, 17.9))
        make_face()
        with BuildLine():
            Line((-14.9, 16.3), (14.9, 16.3))
            ThreePointArc((14.9, 16.3), (15.889949494, 15.889949494), (16.3, 14.9))
            Line((16.3, 14.9), (16.3, -14.9))
            ThreePointArc((16.3, -14.9), (15.889949494, -15.889949494), (14.9, -16.3))
            Line((14.9, -16.3), (-14.9, -16.3))
            ThreePointArc((-14.9, -16.3), (-15.889949494, -15.889949494), (-16.3, -14.9))
            Line((-16.3, -14.9), (-16.3, 14.9))
            ThreePointArc((-16.3, 14.9), (-15.889949494, 15.889949494), (-14.9, 16.3))
        make_face(mode=Mode.SUBTRACT)
    extrude(amount=STRUCTURAL_MEMBERMAIN_4_DEPTH)

    # Structural MemberMain 4 mitre 1
    split(bisect_by=Plane(origin=(343.5375, 291.4, 0), x_dir=(0, -1, 0), z_dir=(-1, 0, 0)), keep=Keep.TOP)

    # Sketch17 → Cut-Extrude1 (cut, through all)
    with BuildSketch(Plane.XY.offset(-17.9)):
        with BuildLine():
            Line((317.5, 304.1), (317.5, 314.5))
            ThreePointArc((317.5, 314.5), (330.2, 327.2), (342.9, 314.5))
            Line((342.9, 314.5), (342.9, 304.1))
            ThreePointArc((342.9, 304.1), (330.2, 291.4), (317.5, 304.1))
        make_face()
    extrude(amount=CUT_EXTRUDE1_DEPTH, mode=Mode.SUBTRACT)


with BuildPart() as body_5:
    # Sketch14 → Structural MemberAngle (new body)
    with BuildSketch(Plane(origin=(343.5375, 0, -17.9), x_dir=(0, 0, -1), z_dir=(1, 0, 0))):
        with BuildLine():
            Line((0, 0), (0, 35))
            ThreePointArc((0, 35), (3.535533906, 33.535533906), (5, 30))
            Line((5, 30), (5, 10))
            ThreePointArc((5, 10), (6.464466094, 6.464466094), (10, 5))
            Line((10, 5), (30, 5))
            ThreePointArc((30, 5), (33.535533906, 3.535533906), (35, 0))
            Line((35, 0), (0, 0))
        make_face()
    extrude(amount=STRUCTURAL_MEMBERANGLE_DEPTH)

    # Sketch15 → Cut-ExtrudeMountingHoles (cut, through all)
    with BuildSketch(Plane(origin=(0, 0, 0), x_dir=(1, 0, 0), z_dir=(0, 1, 0))):
        with Locations(Location((375, 37.9, 0), (0, 0, 90))):
            Circle(SKETCH15_R)
        with Locations(Location((410, 37.9, 0), (0, 0, 90))):
            Circle(SKETCH15_R)
    extrude(amount=CUT_EXTRUDEMOUNTINGHOLES_DEPTH, mode=Mode.SUBTRACT)


with BuildPart() as cut_extrude2_tool:
    # Sketch18 → Cut-Extrude2 (new body)
    with BuildSketch(Plane.XY.offset(17.9).offset(CUT_EXTRUDE2_START)):
        with BuildLine():
            Line((349.3, 319.3), (349.3, 299.3))
            ThreePointArc((349.3, 299.3), (330.2, 280.2), (311.1, 299.3))
            Line((311.1, 299.3), (311.1, 319.3))
            ThreePointArc((311.1, 319.3), (330.2, 338.4), (349.3, 319.3))
        make_face()
    extrude(amount=CUT_EXTRUDE2_DEPTH)


with BuildPart() as body_2_1:
    add(body_2.part)

    # Cut-Extrude2: cut by cut_extrude2_tool
    add(cut_extrude2_tool.part, mode=Mode.SUBTRACT)


with BuildPart() as body_4_1:
    add(body_4.part)

    # Cut-Extrude2: cut by cut_extrude2_tool
    add(cut_extrude2_tool.part, mode=Mode.SUBTRACT)


solid = Compound([part.part, body_3.part, body_5.part, body_2_1.part, body_4_1.part])
